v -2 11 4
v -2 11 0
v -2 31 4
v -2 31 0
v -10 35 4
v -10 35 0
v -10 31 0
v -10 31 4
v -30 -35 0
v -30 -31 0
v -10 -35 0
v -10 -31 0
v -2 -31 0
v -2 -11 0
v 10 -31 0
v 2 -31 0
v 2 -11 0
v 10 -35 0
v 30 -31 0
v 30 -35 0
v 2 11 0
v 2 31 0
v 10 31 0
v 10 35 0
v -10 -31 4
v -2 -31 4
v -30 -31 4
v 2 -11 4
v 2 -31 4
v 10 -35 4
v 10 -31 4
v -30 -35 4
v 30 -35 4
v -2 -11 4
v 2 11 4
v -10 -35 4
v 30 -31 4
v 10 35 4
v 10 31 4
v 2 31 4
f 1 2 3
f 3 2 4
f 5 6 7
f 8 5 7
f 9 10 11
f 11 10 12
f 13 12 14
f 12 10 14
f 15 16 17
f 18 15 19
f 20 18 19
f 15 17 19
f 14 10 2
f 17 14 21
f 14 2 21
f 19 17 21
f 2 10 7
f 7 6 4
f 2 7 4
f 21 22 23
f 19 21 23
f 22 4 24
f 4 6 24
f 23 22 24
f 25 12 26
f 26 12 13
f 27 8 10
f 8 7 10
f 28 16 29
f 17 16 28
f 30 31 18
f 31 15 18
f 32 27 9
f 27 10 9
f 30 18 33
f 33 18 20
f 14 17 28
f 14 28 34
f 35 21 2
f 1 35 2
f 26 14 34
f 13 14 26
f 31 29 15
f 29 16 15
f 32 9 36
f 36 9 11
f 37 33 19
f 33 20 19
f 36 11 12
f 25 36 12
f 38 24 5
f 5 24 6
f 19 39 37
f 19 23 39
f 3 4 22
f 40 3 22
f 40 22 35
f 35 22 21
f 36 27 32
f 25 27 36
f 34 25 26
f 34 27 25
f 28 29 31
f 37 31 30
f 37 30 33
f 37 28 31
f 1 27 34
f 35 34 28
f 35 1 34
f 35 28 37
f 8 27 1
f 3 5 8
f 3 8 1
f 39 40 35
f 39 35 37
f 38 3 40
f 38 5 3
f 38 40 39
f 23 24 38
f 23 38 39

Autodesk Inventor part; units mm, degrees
ref_plane "YZ Plane" through (0, 0, 0) normal (1, 0, 0) x (0, 1, 0)
ref_plane "XZ Plane" through (0, 0, 0) normal (0, 1, 0) x (-1, 0, 0)
ref_plane "XY Plane" through (0, 0, 0) normal (0, 0, 1) x (1, 0, 0)
sketch "Sketch1" plane through (0, 0, 0) normal (0, 0, 1) x (1, 0, 0)
  line L0 (-30, -35) -> (-10, -35)
  line L1 (-10, -35) -> (-10, -31)
  line L2 (-10, -31) -> (10, -31)
  line L3 (10, -31) -> (10, -35)
  line L4 (10, -35) -> (30, -35)
  line L5 (30, -35) -> (30, -31)
  line L6 (10, 35) -> (-10, 35)
  line L7 (-30, -31) -> (-30, -35)
  line L8 (-10, 35) -> (-10, 31)
  line L9 (-10, 31) -> (-30, -31)
  line L10 (10, 35) -> (10, 31)
  line L11 (10, 31) -> (30, -31)
  line L12 (-2, 31) -> (2, 31)
  line L13 (2, 31) -> (2, 11)
  line L14 (2, 11) -> (-2, 11)
  line L15 (-2, 11) -> (-2, 31)
  line L16 (2, -11) -> (-2, -11)
  line L17 (-2, -11) -> (-2, -31)
  line L18 (-2, -31) -> (2, -31)
  line L19 (2, -31) -> (2, -11)
  line L20 (0, 31) -> (0, -31) construction
  point P0 (0, 0)
  point P1 (0, 0)
  point P2 (-2, -31)
  point P3 (2, -31)
  dimension "d0" = 4
  dimension "d1" = 20
  dimension "d2" = 20
  dimension "d3" = 20
  dimension "d4" = 20
  dimension "d5" = 4
  dimension "d6" = 4
  dimension "d7" = 62
  dimension "d8" = 20
  dimension "d9" = 20
  dimension "d10" = 4
extrude "Extrusion1" add sketch "Sketch1" along normal blind 4 contours L7 L9 L8 L6 L10 L11 L5 L4 L3 L2 L19 L16 L17 L1 L0
properties part number "LightGate_Plate" material "MDF Medium Density Fiberboard"
